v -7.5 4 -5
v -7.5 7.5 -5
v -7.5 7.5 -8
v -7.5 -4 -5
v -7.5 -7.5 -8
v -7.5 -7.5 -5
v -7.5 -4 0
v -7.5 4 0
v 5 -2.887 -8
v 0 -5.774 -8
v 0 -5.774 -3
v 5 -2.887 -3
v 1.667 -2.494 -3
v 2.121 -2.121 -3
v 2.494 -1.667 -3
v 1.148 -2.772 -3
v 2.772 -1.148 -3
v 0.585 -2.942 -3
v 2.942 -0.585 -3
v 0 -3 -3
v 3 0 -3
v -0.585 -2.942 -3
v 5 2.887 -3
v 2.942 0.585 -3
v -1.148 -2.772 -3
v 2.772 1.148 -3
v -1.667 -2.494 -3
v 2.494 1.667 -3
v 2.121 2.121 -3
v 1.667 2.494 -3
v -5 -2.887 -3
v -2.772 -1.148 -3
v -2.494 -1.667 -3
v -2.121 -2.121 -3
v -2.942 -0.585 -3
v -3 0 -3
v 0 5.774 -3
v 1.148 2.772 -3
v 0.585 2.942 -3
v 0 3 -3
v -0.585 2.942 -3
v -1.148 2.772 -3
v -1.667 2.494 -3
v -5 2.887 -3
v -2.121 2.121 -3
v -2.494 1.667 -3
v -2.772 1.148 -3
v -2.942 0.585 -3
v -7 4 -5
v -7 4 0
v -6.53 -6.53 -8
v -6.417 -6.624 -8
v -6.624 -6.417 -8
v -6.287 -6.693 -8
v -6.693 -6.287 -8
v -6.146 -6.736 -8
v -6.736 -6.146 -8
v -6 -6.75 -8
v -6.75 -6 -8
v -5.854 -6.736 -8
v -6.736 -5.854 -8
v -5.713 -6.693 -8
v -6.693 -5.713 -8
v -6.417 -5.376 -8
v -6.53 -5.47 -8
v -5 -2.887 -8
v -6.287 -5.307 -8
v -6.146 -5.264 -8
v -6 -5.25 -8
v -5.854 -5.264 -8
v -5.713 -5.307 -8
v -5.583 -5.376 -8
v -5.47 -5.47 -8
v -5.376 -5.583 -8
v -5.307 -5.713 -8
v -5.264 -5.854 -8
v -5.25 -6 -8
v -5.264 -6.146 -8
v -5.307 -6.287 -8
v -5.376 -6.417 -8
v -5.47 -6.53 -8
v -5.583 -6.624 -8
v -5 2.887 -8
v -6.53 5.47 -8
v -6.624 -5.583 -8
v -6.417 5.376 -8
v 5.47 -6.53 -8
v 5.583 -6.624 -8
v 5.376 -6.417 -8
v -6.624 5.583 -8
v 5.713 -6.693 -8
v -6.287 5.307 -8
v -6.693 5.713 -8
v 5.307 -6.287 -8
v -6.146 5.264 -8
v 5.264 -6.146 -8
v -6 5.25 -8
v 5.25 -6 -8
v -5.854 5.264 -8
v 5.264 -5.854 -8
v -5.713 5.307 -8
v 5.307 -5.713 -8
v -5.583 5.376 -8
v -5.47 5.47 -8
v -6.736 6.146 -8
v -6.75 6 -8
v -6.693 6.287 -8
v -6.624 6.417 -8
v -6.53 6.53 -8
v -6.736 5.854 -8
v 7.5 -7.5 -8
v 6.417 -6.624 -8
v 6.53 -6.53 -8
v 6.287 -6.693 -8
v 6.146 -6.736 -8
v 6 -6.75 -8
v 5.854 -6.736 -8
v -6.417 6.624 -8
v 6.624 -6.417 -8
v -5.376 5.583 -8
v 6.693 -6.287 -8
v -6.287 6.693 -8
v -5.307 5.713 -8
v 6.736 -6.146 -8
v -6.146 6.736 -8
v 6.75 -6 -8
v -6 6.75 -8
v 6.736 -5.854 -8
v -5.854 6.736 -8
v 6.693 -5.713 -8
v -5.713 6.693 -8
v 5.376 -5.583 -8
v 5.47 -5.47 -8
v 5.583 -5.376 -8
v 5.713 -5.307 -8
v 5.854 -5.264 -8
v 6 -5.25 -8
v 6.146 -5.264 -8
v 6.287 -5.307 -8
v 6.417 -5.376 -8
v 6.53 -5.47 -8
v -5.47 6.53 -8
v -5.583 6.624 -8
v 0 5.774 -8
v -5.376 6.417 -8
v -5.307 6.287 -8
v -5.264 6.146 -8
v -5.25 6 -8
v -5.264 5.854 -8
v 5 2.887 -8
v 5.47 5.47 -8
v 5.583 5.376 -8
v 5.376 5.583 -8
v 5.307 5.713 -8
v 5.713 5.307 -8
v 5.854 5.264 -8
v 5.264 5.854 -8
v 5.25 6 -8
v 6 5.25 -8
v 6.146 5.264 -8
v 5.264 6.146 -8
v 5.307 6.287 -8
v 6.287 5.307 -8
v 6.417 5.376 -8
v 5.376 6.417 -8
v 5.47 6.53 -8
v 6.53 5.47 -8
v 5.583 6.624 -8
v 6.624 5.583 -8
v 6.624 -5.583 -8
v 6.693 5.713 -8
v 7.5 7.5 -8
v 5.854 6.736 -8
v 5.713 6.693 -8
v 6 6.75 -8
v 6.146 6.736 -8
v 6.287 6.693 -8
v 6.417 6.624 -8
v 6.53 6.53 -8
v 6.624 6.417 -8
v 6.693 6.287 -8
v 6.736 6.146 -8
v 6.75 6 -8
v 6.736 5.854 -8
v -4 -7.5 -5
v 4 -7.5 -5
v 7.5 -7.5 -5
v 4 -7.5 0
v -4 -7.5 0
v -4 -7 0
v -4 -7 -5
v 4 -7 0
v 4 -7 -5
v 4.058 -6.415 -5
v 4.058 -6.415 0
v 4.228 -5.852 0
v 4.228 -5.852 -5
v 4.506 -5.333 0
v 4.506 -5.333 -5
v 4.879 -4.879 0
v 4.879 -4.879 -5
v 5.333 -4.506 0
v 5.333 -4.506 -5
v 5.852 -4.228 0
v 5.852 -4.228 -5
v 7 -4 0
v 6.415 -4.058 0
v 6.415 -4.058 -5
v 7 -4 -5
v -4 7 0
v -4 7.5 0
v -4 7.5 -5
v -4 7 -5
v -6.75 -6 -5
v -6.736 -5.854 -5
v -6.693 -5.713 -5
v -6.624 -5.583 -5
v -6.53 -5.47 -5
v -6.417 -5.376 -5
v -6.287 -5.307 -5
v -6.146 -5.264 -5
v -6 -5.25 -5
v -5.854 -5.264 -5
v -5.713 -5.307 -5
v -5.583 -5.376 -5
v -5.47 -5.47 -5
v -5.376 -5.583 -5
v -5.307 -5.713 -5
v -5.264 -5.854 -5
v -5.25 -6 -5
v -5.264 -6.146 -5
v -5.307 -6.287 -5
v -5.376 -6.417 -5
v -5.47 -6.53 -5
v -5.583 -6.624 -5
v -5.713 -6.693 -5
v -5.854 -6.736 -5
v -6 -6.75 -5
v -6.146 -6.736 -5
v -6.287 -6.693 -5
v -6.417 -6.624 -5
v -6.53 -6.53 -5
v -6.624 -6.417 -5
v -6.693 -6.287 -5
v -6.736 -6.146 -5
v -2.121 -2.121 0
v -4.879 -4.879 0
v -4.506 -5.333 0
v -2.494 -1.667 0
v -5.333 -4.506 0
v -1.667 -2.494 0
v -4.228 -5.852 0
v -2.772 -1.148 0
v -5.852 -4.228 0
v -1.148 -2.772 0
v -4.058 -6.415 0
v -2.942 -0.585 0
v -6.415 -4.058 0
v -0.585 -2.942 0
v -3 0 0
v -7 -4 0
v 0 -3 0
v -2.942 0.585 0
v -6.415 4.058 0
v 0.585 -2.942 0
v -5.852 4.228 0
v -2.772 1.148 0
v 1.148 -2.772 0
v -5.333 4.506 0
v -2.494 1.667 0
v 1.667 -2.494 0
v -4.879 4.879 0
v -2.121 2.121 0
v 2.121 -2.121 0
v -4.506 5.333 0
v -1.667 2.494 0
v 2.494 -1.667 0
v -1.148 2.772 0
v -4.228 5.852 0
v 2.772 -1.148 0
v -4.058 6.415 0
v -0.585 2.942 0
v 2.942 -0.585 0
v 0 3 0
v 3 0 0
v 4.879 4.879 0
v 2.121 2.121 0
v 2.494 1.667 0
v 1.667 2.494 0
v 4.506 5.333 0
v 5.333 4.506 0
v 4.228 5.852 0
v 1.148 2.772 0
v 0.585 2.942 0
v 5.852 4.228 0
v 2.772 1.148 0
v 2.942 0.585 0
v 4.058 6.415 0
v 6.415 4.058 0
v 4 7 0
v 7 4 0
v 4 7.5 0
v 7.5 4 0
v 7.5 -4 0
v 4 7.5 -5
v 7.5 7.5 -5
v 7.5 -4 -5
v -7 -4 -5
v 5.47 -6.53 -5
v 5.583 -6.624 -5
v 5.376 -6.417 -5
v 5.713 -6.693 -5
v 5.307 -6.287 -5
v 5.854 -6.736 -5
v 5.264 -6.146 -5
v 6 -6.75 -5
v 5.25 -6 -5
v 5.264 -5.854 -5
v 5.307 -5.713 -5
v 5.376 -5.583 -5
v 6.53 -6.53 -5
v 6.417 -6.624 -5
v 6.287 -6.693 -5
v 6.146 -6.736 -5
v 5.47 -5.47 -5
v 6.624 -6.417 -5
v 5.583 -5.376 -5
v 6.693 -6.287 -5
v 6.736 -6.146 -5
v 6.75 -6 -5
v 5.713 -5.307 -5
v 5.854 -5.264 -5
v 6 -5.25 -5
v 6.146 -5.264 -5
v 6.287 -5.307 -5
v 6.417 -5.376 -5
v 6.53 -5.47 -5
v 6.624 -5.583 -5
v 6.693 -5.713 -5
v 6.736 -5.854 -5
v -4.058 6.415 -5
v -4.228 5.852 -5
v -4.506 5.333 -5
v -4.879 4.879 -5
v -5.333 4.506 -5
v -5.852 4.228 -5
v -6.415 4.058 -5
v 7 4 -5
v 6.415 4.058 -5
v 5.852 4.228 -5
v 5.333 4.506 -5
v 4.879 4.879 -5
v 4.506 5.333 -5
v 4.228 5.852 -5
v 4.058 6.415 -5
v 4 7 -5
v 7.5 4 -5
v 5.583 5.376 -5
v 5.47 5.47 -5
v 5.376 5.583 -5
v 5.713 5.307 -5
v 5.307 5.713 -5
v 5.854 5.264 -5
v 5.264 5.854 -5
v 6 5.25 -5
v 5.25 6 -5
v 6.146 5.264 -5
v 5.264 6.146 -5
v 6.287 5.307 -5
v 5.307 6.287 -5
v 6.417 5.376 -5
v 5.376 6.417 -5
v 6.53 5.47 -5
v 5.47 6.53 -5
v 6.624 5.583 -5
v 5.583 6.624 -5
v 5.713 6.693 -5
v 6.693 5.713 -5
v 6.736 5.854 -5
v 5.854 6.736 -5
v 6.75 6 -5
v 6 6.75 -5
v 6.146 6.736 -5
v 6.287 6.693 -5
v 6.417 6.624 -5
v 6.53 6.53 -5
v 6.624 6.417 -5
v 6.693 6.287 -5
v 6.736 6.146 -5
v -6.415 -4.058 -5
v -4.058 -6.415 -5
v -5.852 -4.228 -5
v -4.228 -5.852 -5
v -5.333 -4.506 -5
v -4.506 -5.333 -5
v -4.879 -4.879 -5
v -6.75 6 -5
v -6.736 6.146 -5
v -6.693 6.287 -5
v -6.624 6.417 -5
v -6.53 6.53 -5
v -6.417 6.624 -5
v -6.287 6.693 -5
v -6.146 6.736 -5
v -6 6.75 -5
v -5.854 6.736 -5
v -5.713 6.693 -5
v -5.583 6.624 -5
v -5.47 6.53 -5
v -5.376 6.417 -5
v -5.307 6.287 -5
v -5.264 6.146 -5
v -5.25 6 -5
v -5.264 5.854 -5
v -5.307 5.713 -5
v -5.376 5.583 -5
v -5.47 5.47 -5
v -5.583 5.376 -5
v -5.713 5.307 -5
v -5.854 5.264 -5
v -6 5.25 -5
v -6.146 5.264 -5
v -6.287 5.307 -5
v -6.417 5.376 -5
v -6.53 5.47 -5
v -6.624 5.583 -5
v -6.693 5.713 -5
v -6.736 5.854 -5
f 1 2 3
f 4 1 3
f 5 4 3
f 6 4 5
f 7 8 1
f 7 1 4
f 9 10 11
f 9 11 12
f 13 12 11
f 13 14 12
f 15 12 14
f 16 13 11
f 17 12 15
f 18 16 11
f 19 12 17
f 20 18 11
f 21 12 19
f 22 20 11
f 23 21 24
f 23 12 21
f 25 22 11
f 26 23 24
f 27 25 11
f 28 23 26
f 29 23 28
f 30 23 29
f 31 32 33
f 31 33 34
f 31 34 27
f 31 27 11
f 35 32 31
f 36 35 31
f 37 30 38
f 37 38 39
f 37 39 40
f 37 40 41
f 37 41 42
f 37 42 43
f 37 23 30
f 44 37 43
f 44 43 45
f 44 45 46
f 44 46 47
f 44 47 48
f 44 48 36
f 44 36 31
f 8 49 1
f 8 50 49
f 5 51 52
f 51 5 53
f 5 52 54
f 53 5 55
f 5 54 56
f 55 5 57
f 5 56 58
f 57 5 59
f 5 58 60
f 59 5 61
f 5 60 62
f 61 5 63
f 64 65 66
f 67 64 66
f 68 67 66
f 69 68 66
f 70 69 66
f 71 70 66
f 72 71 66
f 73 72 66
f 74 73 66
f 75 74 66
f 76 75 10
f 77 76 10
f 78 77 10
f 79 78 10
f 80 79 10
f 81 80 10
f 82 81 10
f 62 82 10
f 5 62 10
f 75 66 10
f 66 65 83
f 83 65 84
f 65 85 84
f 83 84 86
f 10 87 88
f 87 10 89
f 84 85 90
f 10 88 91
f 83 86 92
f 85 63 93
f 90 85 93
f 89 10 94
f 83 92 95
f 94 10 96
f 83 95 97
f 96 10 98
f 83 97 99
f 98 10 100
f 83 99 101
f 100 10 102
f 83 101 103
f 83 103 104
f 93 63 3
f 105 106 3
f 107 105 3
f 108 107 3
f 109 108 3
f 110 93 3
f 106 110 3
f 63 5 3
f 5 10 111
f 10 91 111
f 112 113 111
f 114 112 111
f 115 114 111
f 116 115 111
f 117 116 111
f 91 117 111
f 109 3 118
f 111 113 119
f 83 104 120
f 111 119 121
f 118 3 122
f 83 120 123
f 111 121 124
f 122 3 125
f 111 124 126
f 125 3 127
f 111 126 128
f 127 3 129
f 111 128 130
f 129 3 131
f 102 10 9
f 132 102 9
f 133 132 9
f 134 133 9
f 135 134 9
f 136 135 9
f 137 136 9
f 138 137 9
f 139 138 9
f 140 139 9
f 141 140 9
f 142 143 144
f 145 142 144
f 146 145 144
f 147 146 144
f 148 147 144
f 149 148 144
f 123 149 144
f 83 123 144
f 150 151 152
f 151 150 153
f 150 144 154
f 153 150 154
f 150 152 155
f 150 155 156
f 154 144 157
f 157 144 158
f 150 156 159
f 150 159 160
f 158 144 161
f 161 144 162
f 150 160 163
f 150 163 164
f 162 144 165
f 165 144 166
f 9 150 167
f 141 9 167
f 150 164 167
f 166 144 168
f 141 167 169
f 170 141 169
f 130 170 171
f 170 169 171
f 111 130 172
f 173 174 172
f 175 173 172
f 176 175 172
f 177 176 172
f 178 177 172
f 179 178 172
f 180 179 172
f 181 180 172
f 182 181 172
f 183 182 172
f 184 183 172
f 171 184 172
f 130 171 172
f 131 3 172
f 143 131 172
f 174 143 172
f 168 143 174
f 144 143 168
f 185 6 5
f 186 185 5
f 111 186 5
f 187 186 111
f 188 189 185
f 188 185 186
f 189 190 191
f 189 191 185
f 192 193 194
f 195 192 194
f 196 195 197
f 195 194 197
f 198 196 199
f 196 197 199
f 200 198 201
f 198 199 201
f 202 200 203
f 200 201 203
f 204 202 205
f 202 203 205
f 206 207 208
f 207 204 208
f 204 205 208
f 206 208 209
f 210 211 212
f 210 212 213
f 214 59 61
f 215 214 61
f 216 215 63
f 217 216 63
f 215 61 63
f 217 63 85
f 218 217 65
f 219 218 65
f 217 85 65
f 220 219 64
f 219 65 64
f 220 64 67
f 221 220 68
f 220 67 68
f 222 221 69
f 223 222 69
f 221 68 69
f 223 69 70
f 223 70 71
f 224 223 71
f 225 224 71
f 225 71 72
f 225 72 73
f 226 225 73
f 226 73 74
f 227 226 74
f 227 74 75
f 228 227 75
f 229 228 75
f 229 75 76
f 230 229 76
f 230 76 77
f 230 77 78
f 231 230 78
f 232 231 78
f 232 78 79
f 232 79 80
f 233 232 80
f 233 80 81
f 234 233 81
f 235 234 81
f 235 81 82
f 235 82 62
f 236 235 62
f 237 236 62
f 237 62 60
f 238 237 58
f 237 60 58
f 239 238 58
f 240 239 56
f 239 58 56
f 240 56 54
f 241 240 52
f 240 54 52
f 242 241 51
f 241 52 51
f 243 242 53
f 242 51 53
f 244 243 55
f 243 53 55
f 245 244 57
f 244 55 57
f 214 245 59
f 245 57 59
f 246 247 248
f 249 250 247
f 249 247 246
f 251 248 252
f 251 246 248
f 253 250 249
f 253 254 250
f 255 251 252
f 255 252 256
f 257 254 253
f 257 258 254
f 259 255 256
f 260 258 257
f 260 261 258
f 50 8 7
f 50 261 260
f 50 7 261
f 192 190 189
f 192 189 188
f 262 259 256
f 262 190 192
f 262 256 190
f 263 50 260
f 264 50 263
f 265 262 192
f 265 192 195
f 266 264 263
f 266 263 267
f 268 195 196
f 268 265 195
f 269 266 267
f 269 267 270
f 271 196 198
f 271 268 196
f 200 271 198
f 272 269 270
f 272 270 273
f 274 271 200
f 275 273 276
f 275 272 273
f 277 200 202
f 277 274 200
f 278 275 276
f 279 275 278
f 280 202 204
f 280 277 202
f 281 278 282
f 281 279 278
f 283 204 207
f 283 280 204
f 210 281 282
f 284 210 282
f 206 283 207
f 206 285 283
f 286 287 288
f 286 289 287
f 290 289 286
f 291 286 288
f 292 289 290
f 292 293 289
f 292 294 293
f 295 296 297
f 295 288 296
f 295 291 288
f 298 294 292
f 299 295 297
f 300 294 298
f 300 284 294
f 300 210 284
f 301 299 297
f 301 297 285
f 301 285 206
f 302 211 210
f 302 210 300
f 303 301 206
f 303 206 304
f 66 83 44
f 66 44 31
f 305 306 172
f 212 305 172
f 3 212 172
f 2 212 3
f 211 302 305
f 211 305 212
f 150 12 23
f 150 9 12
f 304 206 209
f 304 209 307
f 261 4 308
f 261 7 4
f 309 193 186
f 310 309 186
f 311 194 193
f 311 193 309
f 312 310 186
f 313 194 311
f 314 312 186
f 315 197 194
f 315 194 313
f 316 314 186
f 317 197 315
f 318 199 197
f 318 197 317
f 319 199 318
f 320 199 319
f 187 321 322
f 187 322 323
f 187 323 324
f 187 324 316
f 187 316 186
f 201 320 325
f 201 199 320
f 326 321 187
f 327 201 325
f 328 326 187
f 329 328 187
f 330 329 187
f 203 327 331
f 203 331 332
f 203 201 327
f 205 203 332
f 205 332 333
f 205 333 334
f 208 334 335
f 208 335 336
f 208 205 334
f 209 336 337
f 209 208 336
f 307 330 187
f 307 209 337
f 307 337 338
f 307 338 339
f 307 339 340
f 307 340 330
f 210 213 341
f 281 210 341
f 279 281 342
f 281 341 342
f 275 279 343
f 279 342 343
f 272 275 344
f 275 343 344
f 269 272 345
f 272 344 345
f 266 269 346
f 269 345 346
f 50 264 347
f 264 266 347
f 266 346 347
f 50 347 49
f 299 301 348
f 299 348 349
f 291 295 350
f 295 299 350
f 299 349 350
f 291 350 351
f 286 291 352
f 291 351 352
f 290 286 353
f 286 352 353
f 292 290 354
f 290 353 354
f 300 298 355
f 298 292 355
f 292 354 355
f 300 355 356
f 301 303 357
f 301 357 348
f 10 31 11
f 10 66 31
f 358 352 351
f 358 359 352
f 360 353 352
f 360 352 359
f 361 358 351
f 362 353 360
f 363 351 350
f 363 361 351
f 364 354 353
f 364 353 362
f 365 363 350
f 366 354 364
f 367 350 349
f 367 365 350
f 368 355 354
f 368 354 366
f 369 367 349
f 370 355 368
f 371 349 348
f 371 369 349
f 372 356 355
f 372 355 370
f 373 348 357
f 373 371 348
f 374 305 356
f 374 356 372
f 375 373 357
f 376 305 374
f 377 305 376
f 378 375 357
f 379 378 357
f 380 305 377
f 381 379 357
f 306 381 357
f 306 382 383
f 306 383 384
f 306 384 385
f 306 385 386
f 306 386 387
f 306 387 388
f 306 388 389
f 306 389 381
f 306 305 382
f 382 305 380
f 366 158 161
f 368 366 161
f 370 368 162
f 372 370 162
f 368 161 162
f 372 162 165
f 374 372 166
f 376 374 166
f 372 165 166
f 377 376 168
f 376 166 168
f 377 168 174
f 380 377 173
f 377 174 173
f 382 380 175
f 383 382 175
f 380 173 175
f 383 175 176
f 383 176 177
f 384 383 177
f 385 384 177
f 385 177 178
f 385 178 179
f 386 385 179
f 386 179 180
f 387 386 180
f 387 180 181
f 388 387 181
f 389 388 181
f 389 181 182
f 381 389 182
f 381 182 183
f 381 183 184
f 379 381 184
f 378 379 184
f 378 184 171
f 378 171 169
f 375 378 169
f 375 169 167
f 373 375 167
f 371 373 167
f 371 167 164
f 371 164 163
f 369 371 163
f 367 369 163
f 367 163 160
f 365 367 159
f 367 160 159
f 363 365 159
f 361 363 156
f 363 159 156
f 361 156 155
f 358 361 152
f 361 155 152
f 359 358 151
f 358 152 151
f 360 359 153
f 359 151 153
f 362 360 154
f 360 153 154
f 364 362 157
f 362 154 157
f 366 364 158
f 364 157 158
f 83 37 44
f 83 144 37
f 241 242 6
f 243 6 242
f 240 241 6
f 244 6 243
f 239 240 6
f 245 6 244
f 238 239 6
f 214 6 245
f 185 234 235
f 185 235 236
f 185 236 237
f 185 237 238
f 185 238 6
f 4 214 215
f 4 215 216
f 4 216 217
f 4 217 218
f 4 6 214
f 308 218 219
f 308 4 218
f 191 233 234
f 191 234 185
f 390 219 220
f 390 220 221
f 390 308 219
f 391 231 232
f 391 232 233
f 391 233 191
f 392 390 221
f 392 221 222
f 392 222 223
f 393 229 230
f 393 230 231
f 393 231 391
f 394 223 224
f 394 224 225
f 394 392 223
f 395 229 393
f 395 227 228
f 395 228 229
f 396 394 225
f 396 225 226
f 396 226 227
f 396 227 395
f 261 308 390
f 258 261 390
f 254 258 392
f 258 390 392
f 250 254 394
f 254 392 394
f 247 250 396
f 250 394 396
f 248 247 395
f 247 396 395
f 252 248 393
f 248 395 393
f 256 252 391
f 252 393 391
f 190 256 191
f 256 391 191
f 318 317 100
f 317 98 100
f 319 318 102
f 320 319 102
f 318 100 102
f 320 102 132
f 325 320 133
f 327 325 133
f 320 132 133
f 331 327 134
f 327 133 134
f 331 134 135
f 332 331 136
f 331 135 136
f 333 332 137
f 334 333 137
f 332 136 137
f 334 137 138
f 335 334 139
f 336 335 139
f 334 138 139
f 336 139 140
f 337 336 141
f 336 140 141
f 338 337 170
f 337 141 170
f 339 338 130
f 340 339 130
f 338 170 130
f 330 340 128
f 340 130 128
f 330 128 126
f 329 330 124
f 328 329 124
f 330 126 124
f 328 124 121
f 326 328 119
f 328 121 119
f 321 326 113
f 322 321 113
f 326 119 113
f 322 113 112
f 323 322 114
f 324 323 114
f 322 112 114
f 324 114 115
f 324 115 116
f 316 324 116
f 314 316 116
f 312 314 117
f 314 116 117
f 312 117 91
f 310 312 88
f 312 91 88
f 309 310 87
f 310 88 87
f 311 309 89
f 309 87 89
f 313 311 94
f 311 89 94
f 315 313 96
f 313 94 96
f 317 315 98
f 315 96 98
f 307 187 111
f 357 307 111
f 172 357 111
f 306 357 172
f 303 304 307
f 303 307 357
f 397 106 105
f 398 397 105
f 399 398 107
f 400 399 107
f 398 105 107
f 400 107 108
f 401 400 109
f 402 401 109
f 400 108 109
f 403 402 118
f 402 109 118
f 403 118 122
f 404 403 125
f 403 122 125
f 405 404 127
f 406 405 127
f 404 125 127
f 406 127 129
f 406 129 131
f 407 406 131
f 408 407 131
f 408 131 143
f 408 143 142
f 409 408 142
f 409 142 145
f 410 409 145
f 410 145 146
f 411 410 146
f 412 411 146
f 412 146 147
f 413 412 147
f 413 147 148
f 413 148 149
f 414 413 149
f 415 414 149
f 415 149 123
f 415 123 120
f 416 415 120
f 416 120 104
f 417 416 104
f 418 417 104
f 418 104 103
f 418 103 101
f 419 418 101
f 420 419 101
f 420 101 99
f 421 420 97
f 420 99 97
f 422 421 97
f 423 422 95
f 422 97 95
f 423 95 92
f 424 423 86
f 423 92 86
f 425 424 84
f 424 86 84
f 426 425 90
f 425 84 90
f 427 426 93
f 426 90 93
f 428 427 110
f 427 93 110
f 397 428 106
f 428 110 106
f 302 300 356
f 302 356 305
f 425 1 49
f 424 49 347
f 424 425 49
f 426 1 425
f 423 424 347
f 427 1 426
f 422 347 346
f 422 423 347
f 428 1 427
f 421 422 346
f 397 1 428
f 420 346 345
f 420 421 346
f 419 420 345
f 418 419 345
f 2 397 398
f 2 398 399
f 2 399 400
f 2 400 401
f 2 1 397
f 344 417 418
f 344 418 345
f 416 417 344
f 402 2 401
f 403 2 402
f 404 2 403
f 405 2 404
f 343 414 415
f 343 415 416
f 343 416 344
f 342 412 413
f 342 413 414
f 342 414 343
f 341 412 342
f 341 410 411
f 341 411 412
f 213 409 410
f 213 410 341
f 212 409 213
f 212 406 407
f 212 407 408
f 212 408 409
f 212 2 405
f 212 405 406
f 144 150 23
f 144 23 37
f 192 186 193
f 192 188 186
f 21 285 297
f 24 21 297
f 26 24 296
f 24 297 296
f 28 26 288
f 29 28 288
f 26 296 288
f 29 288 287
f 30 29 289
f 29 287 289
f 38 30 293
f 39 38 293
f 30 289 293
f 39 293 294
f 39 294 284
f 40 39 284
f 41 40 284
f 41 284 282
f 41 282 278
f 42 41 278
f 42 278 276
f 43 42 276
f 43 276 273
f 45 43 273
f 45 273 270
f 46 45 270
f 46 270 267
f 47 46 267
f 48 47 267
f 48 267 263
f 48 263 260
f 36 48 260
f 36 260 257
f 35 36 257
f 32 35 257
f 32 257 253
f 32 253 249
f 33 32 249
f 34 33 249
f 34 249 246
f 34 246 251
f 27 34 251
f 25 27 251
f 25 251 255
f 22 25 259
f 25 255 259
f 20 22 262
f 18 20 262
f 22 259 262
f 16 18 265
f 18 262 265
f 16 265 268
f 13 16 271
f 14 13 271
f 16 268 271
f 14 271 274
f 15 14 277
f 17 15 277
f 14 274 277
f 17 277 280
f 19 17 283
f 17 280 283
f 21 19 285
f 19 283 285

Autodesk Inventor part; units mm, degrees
ref_plane "YZ Plane" through (0, 0, 0) normal (1, 0, 0) x (0, 1, 0)
ref_plane "XZ Plane" through (0, 0, 0) normal (0, 1, 0) x (-1, 0, 0)
ref_plane "XY Plane" through (0, 0, 0) normal (0, 0, 1) x (1, 0, 0)
sketch "Boceto1" plane through (0, 0, 0) normal (0, 0, 1) x (1, 0, 0)
  line L0 (-7.5, -7.5) -> (7.5, -7.5)
  line L1 (7.5, -7.5) -> (7.5, 7.5)
  line L2 (7.5, 7.5) -> (-7.5, 7.5)
  line L3 (-7.5, 7.5) -> (-7.5, -7.5)
  line L4 (-7.5, -7.5) -> (7.5, 7.5) construction
  line L5 (7.5, -7.5) -> (-7.5, 7.5) construction
  dimension "d2" = 15
extrude "Extrusión1" add sketch "Boceto1" against normal blind 8
sketch "Boceto2" plane through (0, 0, -8) normal (0, 0, -1) x (-1, 0, 0)
  circle A0 centre (-6, 6) radius 0.75
  line L0 (6, -6) -> (-6, -6) construction
  line L1 (-6, -6) -> (-6, 6) construction
  line L2 (-6, 6) -> (6, 6) construction
  line L3 (6, 6) -> (6, -6) construction
  line L4 (6, -6) -> (-6, 6) construction
  line L5 (-6, -6) -> (6, 6) construction
  circle A1 centre (6, 6) radius 0.75
  circle A2 centre (6, -6) radius 0.75
  circle A3 centre (-6, -6) radius 0.75
  point P0 (0, 0)
  dimension "d5" = 12
  dimension "d6" = 1.5
extrude "Extrusión2" cut sketch "Boceto2" against normal up to surface (8 mm away)
sketch "Boceto3" plane through (0, 0, 0) normal (0, 0, 1) x (1, 0, 0)
  line L0 (7.5, 7.5) -> (-7.5, 7.5) projected
  line L1 (-7.5, 7.5) -> (-4, 7.5)
  line L2 (-4, 7.5) -> (-4, 4)
  line L3 (-4, 4) -> (-7.5, 4)
  line L4 (-7.5, 4) -> (-7.5, 7.5)
  line L5 (-7.5, -7.5) -> (-7.5, -4)
  line L6 (-7.5, -4) -> (-4, -4)
  line L7 (-4, -4) -> (-4, -7.5)
  line L8 (-4, -7.5) -> (-7.5, -7.5)
  line L9 (7.5, -7.5) -> (4, -7.5)
  line L10 (4, -7.5) -> (4, -4)
  line L11 (4, -4) -> (7.5, -4)
  line L12 (7.5, -4) -> (7.5, -7.5)
  line L13 (7.5, 7.5) -> (7.5, 4)
  line L14 (7.5, 4) -> (4, 4)
  line L15 (4, 4) -> (4, 7.5)
  line L16 (4, 7.5) -> (7.5, 7.5)
  point P0 (0, 0)
  point P1 (0, 0)
  point P2 (0, 0)
  point P3 (0, 0)
  dimension "d9" = 3.5
  dimension "d12" = 360
extrude "Extrusión3" cut sketch "Boceto3" against normal blind 5
fillet "Empalme1" radius 3 4 edges at (-4, 4, -2.5) (4, 4, -2.5) (4, -4, -2.5) (-4, -4, -2.5)
sketch "Boceto4" plane through (0, 0, -8) normal (0, 0, -1) x (-1, 0, 0)
  line L0 (0, 5.7735) -> (5, 2.8868)
  line L1 (5, 2.8868) -> (5, -2.8868)
  line L2 (5, -2.8868) -> (0, -5.7735)
  line L3 (0, -5.7735) -> (-5, -2.8868)
  line L4 (-5, -2.8868) -> (-5, 2.8868)
  line L5 (-5, 2.8868) -> (0, 5.7735)
  point P0 (0, 0)
  point P1 (0, 0)
  dimension "d17" = 10
extrude "Extrusión4" cut sketch "Boceto4" against normal blind 5
sketch "Boceto5" plane through (0, 0, 0) normal (0, 0, 1) x (1, 0, 0)
  circle A0 centre (0, 0) radius 3
  dimension "d20" = 6
extrude "Extrusión5" cut sketch "Boceto5" against normal up to surface (8 mm away)
properties part number "sujecion_cable"
